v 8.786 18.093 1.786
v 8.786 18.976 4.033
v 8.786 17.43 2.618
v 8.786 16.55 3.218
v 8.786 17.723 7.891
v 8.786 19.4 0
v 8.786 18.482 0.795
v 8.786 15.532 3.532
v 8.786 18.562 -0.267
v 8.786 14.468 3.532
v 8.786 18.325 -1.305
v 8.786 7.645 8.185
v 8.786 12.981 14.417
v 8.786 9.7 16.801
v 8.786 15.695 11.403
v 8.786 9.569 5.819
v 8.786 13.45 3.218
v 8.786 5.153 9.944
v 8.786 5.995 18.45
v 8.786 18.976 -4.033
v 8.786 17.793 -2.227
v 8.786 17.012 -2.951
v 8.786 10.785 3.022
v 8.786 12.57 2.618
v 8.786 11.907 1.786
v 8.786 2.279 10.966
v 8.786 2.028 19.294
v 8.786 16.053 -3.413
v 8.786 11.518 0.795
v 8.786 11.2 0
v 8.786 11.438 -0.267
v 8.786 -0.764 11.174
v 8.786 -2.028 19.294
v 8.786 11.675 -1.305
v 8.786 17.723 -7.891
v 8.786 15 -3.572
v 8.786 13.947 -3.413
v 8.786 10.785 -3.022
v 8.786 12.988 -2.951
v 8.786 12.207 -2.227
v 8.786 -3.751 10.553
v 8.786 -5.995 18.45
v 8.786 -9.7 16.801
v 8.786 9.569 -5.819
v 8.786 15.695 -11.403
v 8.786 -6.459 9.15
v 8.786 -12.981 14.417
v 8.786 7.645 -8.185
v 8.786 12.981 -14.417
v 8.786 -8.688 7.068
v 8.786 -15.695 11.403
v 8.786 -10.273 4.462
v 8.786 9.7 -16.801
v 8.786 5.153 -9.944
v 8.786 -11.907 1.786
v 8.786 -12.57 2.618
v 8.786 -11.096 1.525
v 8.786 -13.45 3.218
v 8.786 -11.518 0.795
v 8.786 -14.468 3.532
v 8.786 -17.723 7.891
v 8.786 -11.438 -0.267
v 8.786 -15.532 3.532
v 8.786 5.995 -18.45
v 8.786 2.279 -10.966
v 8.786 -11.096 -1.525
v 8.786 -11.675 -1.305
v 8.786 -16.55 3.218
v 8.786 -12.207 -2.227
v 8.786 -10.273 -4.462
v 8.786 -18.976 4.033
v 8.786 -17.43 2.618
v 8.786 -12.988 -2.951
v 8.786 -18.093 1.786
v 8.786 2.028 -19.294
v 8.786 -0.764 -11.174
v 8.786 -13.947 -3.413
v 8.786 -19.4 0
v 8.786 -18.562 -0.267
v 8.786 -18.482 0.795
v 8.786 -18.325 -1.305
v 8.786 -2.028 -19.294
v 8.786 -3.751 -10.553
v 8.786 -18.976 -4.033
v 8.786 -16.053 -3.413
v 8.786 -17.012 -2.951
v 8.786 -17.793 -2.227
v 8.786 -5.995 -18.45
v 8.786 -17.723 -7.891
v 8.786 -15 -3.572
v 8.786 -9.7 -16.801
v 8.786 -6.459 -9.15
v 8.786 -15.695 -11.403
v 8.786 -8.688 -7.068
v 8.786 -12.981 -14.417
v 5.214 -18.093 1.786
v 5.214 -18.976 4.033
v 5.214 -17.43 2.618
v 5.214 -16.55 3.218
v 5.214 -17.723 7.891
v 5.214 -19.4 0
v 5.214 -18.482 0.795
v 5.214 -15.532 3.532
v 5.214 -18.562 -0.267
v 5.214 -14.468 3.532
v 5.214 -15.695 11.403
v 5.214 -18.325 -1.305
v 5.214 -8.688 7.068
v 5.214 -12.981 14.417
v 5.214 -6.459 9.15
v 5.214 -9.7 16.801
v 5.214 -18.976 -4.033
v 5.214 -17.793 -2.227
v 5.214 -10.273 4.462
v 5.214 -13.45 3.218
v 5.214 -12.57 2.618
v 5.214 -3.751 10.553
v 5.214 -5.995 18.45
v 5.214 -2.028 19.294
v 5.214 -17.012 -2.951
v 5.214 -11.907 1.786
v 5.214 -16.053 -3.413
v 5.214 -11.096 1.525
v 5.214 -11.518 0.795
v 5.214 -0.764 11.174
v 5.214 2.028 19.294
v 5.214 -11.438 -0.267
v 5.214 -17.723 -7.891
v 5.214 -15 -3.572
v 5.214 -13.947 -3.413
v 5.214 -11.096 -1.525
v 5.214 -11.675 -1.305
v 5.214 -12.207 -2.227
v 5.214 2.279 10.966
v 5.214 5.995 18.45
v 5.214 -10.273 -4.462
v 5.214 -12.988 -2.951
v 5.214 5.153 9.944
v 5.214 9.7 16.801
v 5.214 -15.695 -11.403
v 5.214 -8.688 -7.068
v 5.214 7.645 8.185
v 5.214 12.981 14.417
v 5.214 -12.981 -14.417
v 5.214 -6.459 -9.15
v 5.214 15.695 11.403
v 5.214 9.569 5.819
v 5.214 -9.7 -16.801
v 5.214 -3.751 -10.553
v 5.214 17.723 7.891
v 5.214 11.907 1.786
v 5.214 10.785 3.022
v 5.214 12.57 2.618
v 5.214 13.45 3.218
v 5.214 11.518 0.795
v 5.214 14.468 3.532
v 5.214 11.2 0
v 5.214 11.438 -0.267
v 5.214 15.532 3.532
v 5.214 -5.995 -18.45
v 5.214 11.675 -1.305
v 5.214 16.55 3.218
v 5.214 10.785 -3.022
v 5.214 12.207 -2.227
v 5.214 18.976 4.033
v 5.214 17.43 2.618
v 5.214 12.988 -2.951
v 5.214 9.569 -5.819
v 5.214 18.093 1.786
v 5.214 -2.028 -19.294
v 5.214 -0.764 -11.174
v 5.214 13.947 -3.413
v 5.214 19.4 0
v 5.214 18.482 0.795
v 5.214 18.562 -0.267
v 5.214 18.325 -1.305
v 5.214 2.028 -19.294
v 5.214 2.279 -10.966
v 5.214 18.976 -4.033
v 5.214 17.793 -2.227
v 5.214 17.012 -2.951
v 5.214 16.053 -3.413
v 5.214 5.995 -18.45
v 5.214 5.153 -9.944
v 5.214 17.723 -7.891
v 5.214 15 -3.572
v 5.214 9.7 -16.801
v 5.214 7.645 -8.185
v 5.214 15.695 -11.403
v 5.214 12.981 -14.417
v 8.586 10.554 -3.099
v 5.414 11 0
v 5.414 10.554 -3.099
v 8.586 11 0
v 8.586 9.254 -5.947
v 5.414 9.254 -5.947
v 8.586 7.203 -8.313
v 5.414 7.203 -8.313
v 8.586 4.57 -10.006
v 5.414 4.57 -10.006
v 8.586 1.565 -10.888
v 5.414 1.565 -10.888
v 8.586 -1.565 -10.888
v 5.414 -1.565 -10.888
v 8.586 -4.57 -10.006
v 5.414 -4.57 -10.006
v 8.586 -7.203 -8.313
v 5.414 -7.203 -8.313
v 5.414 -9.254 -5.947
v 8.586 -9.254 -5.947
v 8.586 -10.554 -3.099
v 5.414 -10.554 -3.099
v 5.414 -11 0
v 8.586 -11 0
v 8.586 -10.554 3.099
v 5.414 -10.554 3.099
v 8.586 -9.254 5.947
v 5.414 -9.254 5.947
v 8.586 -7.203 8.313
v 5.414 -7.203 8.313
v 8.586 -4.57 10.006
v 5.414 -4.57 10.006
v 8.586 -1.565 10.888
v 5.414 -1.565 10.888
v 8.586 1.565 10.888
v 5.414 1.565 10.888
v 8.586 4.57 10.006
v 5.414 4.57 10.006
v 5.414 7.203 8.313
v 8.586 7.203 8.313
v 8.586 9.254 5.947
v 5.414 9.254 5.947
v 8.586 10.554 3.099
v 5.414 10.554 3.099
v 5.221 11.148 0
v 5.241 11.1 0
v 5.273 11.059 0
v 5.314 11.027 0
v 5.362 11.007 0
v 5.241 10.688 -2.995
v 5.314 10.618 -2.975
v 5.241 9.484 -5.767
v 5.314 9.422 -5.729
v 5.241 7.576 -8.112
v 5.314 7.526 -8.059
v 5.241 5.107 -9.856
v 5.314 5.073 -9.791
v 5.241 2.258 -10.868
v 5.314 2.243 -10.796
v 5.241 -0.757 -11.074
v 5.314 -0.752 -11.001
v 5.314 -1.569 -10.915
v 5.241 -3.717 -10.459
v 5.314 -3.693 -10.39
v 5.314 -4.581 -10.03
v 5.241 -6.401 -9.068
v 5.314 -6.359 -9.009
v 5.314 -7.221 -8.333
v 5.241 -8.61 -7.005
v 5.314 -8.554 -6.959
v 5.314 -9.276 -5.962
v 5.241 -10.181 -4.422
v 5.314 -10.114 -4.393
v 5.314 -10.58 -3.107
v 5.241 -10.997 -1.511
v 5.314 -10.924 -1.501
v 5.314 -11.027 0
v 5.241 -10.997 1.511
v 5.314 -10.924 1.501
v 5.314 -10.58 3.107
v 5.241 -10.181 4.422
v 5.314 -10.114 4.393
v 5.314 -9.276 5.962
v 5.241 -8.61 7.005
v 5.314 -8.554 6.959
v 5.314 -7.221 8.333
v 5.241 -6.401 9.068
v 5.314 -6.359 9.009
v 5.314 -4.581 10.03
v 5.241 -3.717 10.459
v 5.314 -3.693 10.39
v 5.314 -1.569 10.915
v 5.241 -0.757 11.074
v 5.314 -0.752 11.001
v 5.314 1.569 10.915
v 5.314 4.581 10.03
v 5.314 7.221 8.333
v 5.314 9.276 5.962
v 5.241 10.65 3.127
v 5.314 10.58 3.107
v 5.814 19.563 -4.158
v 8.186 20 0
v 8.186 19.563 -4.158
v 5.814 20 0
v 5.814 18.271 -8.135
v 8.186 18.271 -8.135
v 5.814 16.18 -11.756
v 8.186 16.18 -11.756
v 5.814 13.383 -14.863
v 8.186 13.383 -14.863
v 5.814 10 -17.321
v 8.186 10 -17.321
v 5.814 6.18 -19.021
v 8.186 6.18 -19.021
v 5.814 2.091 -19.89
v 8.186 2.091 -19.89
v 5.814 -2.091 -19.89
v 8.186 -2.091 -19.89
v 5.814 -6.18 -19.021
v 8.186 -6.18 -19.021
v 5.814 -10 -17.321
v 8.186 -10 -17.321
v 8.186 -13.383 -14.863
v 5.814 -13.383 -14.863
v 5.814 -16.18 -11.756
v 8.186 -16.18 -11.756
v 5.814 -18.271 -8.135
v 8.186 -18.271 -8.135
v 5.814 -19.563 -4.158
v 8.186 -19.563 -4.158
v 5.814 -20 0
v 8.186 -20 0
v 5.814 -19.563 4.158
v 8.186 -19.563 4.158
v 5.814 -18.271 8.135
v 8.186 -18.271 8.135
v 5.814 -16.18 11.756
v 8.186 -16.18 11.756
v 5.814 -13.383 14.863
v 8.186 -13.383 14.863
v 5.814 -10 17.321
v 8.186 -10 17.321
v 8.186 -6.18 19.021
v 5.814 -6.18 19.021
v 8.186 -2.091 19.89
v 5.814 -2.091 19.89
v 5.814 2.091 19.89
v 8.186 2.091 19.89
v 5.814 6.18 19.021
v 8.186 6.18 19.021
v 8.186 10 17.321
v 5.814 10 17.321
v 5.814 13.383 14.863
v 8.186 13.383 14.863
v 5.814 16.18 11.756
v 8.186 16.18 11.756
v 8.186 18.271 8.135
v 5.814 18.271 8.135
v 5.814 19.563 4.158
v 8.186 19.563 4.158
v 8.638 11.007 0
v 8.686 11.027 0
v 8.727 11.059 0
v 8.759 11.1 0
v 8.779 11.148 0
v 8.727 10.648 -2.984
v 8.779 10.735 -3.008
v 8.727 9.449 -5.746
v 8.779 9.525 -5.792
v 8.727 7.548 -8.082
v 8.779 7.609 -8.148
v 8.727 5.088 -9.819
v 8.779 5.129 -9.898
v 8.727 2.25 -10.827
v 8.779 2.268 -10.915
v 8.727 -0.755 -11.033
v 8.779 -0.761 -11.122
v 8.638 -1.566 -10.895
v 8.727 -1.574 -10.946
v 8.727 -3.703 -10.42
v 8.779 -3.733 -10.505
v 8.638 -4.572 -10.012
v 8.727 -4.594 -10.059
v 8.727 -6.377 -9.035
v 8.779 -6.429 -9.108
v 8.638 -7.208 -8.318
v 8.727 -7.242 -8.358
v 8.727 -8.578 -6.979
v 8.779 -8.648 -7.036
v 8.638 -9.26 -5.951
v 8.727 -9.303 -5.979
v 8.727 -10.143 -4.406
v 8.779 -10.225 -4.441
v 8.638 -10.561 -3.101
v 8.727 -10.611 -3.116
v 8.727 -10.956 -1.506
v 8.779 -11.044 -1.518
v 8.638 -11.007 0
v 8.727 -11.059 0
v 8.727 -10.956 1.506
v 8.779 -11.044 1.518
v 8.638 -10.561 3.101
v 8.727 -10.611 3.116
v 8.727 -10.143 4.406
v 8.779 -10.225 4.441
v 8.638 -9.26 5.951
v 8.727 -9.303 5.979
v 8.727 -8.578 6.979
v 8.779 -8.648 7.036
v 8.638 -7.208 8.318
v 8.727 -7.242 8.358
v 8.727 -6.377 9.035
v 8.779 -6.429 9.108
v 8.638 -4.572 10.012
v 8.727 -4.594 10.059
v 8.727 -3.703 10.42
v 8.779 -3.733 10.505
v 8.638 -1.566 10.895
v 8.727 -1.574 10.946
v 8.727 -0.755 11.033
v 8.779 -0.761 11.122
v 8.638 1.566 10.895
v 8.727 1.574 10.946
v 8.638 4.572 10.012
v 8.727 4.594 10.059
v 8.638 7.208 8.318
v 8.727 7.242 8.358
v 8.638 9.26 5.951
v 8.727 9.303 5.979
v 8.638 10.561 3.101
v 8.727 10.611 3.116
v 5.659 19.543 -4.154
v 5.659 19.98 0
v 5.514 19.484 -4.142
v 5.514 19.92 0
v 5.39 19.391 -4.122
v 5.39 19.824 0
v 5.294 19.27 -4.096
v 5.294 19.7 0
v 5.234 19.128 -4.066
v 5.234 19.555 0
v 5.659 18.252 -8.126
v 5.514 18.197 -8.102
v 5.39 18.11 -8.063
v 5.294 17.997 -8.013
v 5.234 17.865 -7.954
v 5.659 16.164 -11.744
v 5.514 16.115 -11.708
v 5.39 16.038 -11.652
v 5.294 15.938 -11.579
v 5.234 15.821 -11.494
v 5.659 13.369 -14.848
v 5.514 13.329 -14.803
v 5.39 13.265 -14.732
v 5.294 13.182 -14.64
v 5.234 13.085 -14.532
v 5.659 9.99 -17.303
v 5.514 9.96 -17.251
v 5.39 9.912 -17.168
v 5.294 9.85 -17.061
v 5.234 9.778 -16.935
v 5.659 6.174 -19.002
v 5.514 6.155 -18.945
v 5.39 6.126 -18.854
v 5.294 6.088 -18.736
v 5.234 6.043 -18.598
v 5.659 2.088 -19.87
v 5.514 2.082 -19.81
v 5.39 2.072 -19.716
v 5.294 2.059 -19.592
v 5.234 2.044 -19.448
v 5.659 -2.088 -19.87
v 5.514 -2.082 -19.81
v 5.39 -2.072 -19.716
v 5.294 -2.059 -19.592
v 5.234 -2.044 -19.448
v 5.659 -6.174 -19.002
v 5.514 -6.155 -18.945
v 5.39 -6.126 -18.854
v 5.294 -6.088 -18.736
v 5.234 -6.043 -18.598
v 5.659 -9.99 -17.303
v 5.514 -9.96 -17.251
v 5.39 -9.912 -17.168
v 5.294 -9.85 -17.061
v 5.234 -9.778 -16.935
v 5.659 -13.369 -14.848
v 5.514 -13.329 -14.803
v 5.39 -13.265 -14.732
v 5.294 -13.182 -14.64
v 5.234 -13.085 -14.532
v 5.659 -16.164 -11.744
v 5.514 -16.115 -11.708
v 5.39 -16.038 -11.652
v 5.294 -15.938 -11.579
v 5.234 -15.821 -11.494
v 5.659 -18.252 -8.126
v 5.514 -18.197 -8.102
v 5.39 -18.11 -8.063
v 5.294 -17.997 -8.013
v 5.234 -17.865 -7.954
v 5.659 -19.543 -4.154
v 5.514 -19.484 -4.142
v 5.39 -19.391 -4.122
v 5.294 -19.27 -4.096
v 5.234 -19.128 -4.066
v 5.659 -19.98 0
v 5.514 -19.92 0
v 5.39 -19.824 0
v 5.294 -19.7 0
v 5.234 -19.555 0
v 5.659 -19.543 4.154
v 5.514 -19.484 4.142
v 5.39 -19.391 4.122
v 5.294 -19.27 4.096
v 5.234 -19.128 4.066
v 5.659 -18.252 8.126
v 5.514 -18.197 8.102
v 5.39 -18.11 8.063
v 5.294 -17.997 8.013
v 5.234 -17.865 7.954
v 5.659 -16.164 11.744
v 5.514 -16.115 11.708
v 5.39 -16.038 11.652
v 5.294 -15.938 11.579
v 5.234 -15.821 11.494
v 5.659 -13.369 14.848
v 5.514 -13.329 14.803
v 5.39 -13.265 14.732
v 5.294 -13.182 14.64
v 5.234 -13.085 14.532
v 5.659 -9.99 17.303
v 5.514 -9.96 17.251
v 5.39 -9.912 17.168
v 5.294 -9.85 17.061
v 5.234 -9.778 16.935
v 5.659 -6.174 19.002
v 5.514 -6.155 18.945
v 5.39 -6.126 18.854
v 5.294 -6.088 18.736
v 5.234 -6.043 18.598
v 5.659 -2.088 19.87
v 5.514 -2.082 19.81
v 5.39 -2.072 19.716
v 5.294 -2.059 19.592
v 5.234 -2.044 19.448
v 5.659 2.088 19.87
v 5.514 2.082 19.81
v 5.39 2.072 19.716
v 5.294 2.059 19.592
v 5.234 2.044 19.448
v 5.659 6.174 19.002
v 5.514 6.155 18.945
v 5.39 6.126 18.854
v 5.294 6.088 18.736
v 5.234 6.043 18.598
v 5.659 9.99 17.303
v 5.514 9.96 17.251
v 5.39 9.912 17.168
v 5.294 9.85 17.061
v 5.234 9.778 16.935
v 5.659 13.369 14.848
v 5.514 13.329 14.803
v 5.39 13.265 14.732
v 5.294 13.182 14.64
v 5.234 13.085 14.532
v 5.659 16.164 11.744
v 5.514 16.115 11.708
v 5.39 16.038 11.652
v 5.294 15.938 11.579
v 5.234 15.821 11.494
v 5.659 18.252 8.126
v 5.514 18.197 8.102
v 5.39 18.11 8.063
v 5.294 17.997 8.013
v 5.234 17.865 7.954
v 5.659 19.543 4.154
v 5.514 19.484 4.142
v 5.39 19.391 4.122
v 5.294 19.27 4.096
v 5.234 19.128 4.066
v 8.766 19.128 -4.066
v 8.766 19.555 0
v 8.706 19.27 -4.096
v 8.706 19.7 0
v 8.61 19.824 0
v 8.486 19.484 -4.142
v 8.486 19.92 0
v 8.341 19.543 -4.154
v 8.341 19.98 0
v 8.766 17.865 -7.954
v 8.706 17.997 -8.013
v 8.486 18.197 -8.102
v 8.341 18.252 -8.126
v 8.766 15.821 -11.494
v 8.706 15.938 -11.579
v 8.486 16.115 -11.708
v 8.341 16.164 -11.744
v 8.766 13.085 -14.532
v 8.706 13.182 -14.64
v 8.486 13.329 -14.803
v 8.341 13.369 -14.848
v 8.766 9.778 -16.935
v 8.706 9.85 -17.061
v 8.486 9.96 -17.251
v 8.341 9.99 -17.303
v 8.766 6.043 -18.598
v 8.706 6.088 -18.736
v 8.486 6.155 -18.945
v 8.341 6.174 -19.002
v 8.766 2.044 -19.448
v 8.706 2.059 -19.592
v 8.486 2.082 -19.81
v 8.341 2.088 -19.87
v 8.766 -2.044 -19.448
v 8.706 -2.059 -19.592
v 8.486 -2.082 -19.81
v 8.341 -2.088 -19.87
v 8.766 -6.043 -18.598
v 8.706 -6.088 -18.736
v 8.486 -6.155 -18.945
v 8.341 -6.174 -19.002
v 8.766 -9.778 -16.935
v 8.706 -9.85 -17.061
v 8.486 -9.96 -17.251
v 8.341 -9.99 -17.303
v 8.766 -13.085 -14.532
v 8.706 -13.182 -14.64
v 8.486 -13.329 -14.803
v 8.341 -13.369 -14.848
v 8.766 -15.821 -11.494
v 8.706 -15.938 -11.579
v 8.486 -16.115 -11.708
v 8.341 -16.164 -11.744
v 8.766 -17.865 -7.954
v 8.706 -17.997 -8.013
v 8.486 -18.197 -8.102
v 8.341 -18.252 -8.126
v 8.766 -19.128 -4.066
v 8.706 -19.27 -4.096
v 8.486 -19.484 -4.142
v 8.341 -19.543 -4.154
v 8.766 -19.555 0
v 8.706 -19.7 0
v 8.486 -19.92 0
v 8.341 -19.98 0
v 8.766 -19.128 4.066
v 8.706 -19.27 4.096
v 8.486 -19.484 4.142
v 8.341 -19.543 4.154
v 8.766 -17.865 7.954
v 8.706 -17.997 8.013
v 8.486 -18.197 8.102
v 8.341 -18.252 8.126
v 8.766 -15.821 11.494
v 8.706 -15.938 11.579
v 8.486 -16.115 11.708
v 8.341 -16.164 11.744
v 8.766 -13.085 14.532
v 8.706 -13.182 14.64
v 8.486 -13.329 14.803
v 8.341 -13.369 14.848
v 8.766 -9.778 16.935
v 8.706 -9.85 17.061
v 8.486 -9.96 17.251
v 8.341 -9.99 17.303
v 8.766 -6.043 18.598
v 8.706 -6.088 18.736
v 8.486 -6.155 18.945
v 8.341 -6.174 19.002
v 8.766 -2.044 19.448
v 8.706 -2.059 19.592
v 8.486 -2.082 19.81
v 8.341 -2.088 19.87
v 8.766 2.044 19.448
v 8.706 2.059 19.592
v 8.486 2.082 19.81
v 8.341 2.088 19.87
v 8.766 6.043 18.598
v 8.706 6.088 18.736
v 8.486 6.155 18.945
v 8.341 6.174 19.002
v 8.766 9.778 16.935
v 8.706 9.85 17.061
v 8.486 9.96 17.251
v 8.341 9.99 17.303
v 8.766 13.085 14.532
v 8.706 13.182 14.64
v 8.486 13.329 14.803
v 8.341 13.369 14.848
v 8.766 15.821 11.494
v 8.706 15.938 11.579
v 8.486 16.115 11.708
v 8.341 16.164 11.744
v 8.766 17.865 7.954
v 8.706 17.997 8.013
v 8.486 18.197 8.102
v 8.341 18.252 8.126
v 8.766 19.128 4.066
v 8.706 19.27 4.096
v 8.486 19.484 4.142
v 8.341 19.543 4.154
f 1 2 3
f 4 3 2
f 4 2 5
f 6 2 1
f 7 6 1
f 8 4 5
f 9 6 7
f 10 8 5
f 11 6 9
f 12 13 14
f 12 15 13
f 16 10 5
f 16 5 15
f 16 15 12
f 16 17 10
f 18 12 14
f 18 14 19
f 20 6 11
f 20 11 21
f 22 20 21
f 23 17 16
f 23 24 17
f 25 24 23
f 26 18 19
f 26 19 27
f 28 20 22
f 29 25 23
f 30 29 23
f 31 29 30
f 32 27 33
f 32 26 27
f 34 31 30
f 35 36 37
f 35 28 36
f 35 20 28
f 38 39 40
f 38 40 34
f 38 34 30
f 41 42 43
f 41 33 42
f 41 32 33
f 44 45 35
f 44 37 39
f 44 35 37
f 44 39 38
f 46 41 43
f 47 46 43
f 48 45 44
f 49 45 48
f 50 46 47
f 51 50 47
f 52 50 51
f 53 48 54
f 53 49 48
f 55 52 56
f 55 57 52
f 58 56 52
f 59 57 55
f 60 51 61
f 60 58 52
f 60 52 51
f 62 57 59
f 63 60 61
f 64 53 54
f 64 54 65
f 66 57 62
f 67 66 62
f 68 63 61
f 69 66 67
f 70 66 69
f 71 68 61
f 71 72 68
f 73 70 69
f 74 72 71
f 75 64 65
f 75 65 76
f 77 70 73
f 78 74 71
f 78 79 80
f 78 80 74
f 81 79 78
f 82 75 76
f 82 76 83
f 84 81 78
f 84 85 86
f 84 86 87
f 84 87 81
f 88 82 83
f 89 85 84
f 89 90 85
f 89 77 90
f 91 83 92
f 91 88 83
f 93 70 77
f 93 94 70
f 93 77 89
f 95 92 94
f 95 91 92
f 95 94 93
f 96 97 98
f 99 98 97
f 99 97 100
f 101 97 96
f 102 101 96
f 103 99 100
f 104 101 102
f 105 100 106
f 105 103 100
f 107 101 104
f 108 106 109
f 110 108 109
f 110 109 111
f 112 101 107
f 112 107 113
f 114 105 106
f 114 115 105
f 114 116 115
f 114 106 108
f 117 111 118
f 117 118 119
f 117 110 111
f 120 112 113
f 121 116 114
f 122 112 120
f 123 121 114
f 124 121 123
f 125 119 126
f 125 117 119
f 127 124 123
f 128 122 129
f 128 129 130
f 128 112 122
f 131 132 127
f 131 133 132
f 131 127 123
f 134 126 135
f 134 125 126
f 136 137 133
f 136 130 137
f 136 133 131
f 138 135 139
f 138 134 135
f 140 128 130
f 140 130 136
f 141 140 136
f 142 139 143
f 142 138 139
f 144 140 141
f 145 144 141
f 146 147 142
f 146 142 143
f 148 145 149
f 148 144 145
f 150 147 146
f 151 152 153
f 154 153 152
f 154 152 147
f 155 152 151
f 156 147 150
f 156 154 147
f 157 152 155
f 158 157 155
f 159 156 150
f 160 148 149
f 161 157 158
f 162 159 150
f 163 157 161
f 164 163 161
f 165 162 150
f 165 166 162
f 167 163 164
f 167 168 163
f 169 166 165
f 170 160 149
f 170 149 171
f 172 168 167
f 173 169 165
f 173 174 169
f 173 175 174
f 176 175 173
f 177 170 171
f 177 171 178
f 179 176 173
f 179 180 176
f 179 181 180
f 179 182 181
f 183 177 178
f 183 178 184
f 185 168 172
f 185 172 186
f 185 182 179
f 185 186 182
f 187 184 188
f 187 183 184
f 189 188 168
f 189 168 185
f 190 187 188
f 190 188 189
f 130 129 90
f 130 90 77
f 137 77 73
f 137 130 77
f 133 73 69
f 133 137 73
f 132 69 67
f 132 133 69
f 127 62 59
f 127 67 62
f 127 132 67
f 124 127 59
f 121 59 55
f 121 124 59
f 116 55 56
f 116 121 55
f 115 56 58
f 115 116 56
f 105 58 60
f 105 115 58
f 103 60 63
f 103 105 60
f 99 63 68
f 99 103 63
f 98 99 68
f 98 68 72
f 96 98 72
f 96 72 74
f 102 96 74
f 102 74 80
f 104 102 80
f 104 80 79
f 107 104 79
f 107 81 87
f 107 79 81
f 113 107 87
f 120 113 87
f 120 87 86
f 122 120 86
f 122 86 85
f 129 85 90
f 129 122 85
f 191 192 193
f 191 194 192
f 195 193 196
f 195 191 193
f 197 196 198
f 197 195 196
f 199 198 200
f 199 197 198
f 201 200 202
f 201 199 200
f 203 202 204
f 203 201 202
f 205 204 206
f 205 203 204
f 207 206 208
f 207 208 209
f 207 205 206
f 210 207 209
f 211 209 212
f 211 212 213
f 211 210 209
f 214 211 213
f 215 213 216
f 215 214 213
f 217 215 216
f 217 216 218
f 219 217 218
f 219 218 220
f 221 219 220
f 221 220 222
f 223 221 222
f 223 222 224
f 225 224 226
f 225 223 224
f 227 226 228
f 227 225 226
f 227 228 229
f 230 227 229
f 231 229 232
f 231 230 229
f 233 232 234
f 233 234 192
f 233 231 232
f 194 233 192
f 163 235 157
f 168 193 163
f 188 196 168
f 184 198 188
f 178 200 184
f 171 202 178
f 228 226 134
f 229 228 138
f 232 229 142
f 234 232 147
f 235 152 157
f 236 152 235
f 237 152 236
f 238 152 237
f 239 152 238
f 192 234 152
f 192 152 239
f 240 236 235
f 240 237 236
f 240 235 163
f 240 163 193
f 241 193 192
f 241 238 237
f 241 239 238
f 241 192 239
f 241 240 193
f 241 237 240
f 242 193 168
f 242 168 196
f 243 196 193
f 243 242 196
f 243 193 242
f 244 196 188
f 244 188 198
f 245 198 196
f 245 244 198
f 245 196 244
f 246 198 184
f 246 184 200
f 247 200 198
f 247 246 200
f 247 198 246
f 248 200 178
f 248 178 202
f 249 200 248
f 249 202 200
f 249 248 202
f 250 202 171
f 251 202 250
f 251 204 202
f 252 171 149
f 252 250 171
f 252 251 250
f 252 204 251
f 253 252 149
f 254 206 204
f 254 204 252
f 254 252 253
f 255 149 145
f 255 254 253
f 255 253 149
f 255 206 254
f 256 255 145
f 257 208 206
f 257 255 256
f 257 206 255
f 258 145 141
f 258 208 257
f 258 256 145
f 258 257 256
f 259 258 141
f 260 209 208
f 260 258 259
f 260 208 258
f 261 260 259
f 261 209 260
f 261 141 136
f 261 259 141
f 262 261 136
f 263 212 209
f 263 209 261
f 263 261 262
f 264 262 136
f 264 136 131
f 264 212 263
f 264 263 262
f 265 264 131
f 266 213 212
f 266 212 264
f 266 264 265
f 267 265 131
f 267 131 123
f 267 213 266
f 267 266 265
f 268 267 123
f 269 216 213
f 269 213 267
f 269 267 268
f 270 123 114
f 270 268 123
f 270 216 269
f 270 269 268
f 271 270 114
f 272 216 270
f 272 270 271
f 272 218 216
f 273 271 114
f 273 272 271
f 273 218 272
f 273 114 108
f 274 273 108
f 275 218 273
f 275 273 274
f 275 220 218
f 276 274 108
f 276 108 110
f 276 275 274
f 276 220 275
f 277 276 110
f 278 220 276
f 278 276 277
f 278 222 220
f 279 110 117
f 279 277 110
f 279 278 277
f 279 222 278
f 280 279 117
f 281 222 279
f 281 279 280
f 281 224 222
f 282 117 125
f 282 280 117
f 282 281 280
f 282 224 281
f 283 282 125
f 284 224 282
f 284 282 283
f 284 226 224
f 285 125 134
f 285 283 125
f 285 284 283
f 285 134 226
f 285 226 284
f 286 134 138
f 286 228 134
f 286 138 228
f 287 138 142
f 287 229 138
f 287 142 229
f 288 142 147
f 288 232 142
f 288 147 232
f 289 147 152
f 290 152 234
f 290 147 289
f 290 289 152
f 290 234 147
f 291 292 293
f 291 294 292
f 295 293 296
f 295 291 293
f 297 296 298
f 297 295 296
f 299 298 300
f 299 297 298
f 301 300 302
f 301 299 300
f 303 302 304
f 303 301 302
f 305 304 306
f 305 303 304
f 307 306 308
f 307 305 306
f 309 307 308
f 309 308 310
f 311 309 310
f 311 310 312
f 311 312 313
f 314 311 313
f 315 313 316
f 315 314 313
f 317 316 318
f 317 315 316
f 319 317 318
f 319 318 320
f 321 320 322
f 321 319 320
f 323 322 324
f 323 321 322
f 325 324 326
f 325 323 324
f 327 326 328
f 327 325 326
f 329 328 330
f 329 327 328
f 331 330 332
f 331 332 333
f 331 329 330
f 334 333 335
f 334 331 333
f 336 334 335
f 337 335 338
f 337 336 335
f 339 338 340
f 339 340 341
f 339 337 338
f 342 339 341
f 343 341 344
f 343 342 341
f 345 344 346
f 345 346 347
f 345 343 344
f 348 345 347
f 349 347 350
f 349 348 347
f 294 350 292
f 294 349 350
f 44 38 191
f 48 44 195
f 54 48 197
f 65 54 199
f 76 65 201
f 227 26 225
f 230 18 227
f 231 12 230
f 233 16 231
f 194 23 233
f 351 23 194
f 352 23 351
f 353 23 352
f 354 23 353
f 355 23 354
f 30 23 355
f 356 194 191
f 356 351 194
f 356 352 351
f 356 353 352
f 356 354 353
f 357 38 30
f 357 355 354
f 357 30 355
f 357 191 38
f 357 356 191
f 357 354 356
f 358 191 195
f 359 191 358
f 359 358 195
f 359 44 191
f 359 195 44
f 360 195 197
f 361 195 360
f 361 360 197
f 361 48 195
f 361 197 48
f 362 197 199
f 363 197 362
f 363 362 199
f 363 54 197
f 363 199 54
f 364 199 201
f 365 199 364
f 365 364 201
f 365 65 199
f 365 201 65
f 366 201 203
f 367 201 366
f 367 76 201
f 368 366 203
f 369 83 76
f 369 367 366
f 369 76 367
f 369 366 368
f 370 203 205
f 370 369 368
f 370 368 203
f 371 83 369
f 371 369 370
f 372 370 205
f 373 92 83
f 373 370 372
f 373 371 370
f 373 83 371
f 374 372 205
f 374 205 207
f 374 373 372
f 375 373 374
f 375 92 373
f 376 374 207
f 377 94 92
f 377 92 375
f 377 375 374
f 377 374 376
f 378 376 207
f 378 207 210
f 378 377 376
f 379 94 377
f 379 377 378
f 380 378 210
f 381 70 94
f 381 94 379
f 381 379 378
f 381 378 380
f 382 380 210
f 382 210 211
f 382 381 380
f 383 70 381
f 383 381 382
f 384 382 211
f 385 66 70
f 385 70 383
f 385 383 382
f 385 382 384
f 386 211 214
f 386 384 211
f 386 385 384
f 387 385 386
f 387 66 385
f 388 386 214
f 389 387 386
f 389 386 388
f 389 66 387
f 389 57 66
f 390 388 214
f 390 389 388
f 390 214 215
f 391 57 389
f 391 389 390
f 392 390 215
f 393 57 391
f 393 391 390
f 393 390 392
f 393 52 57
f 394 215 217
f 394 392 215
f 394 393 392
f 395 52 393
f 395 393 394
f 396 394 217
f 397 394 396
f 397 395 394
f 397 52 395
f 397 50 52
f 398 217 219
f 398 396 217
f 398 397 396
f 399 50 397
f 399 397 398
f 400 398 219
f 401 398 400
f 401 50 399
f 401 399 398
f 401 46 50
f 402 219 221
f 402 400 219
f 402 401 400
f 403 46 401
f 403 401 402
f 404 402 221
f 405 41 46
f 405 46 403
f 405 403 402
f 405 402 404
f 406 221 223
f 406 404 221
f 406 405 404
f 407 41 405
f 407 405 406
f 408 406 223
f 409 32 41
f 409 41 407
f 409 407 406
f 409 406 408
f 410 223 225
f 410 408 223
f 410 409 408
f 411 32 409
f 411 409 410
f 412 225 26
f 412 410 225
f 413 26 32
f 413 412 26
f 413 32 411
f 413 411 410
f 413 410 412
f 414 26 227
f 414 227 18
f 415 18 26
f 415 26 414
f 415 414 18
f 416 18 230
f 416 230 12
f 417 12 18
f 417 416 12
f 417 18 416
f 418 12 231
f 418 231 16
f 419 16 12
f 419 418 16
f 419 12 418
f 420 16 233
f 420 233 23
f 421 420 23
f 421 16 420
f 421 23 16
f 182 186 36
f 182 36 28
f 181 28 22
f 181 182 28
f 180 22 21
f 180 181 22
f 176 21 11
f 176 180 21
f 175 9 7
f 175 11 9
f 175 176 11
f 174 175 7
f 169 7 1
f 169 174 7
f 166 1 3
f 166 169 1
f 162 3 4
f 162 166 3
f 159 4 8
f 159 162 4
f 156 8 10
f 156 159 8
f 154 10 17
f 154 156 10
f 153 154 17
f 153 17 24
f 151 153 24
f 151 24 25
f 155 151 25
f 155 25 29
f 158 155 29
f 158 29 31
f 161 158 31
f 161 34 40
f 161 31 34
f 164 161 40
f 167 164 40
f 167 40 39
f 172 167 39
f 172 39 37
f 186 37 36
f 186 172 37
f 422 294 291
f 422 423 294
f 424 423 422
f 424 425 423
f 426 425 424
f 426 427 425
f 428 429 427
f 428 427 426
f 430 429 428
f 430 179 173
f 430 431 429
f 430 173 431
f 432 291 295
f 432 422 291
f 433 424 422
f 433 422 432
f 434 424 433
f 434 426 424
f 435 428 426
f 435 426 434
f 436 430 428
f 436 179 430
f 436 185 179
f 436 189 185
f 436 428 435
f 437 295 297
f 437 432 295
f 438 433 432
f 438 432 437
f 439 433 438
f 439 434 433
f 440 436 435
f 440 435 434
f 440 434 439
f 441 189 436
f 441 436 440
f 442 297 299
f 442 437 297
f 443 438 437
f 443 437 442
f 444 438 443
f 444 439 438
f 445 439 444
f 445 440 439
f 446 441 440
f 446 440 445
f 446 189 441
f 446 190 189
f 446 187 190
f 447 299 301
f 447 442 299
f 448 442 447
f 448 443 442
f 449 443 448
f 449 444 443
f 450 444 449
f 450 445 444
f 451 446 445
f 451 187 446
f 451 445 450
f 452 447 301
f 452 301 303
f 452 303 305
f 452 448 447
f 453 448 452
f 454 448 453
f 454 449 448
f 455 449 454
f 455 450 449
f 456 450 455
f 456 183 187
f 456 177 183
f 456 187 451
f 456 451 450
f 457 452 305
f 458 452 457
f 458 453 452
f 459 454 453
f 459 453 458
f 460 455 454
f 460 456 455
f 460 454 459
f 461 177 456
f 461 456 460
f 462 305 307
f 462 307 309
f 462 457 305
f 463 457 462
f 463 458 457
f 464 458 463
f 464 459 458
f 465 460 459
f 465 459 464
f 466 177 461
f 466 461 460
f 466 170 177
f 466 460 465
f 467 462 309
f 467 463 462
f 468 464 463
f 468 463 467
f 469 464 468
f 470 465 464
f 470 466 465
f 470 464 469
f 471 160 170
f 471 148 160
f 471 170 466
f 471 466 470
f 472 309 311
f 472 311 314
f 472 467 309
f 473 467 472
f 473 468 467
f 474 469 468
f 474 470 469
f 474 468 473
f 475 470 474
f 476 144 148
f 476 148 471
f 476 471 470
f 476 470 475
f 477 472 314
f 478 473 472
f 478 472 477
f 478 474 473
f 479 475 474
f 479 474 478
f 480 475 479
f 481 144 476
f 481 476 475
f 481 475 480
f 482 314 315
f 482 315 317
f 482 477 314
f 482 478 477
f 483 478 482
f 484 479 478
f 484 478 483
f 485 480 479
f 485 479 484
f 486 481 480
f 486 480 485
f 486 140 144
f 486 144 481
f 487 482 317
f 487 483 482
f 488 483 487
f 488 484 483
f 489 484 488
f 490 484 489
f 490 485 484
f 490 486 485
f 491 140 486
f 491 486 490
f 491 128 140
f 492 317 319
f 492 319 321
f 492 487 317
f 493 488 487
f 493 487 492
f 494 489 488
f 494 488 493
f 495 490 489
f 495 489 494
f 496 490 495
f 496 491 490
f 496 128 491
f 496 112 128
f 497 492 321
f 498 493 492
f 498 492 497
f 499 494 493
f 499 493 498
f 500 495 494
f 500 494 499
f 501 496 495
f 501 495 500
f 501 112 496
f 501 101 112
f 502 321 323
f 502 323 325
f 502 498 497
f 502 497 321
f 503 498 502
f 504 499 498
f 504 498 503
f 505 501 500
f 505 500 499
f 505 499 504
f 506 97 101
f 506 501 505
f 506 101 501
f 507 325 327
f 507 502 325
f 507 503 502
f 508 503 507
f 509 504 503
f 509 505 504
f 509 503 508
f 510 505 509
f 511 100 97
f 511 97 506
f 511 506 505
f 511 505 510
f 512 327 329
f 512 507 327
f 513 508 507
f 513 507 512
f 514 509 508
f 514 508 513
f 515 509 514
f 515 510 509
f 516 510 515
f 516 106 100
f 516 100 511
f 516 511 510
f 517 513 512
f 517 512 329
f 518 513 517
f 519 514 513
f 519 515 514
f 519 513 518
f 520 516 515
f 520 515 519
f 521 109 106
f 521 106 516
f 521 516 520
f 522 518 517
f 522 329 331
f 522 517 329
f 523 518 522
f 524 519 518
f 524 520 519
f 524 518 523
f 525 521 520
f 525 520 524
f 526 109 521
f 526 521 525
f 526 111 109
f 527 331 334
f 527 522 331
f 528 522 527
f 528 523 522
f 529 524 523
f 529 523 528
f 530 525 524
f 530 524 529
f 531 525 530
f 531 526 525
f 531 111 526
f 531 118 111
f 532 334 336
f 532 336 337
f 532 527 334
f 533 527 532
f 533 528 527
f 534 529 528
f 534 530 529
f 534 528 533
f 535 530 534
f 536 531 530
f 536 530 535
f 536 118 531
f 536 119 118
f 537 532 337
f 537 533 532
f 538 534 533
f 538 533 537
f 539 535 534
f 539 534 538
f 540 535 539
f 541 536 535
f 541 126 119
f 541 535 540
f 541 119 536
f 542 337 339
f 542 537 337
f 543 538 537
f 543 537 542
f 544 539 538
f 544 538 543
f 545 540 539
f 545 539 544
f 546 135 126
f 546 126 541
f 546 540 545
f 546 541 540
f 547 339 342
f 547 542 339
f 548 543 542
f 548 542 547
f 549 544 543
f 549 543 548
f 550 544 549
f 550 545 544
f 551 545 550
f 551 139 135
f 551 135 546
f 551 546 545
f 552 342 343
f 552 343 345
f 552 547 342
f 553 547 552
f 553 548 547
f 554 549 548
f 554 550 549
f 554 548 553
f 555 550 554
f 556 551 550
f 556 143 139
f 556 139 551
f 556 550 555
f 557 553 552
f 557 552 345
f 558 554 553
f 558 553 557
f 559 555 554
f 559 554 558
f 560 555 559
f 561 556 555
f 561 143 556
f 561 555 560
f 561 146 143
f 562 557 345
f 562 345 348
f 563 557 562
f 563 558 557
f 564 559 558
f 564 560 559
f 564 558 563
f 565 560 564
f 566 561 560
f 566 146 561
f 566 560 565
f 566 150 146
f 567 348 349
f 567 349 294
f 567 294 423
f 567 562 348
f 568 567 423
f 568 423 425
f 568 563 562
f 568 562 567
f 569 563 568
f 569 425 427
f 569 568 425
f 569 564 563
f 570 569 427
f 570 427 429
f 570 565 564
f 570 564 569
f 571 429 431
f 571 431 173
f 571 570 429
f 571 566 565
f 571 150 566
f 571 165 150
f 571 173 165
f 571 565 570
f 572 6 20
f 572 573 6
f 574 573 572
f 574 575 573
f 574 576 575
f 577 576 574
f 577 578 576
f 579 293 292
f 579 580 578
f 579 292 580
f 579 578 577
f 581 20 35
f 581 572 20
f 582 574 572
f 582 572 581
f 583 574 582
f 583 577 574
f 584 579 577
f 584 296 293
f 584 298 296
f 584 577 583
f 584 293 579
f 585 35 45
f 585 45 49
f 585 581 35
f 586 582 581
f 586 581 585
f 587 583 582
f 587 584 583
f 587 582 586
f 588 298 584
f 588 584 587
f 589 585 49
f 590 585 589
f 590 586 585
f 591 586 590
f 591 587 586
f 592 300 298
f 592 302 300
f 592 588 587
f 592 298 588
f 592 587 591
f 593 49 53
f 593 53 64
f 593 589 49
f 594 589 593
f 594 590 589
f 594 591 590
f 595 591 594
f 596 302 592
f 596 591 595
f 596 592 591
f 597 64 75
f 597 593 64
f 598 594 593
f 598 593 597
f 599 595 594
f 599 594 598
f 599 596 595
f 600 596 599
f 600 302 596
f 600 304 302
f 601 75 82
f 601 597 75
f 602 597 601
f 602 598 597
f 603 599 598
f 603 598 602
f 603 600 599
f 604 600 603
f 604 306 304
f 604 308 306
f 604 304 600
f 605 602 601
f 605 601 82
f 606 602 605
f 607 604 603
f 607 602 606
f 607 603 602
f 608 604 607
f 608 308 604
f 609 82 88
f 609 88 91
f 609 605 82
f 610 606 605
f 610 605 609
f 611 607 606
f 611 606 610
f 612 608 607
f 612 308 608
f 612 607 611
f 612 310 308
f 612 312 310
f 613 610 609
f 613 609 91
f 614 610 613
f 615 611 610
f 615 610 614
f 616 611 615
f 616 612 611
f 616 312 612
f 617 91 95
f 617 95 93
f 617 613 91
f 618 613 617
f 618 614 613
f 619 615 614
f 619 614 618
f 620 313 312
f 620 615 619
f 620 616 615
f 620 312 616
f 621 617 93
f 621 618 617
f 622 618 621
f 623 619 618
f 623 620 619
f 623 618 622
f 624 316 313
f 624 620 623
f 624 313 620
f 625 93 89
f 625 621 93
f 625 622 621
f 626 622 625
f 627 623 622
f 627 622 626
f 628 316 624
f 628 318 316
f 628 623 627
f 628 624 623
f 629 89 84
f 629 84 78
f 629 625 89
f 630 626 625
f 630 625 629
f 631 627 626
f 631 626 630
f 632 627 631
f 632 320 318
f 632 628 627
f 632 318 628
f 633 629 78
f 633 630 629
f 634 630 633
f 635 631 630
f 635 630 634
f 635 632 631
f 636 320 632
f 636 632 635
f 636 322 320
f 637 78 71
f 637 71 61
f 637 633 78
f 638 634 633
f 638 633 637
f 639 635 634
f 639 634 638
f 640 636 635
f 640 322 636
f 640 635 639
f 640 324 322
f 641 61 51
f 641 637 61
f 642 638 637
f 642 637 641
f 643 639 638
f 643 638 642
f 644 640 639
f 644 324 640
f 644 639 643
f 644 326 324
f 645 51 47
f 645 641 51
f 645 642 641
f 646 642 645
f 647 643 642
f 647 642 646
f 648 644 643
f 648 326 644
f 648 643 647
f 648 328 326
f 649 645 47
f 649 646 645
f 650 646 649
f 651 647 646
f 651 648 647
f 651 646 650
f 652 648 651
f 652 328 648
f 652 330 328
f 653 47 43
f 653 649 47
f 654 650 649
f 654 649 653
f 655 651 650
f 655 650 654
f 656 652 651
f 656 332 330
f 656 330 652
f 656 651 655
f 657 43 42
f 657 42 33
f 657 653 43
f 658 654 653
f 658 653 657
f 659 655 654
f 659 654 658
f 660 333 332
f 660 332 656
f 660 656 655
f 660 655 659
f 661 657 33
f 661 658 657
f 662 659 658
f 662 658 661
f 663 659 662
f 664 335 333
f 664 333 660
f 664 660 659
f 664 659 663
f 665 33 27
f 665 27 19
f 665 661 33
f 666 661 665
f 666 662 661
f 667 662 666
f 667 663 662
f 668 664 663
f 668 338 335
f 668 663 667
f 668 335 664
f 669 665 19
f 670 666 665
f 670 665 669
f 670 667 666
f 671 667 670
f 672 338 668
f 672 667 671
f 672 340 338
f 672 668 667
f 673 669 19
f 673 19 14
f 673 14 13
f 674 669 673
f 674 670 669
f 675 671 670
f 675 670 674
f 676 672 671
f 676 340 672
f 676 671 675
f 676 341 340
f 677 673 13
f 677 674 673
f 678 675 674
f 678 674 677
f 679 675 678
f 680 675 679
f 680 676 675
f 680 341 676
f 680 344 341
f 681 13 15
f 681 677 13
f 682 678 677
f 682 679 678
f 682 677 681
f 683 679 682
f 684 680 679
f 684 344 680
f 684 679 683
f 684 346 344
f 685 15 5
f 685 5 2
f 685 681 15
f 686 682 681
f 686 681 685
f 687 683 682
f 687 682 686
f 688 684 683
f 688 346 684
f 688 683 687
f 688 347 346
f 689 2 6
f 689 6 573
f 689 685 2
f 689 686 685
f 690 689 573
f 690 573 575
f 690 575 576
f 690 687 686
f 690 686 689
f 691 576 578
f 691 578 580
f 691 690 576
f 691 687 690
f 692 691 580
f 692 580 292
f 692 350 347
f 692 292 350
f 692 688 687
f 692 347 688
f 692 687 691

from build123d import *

# Parameters (mm, degrees)
CROQUIS2_R     = 3.572
EXTRUIR1_DEPTH = 12.358
CROQUIS3_R     = 3.572
EXTRUIR2_DEPTH = 12.358


with BuildPart() as part:
    # Croquis1 → Revolución1 (revolve)
    with BuildSketch(Plane.XY):
        with BuildLine():
            Line((5.214, 19.4), (5.214, 11.2))
            ThreePointArc((5.214, 11.2), (5.272578644, 11.058578644), (5.414, 11))
            Line((5.414, 11), (8.586, 11))
            ThreePointArc((8.586, 11), (8.727421356, 11.058578644), (8.786, 11.2))
            Line((8.786, 11.2), (8.786, 19.4))
            ThreePointArc((8.786, 19.4), (8.610264069, 19.824264069), (8.186, 20))
            Line((8.186, 20), (5.814, 20))
            ThreePointArc((5.814, 20), (5.389735931, 19.824264069), (5.214, 19.4))
        make_face()
    revolve(axis=Axis((50, 0, 0), (-1, 0, 0)))

    # Croquis2 → Extruir1 (cut)
    with BuildSketch(Plane(origin=(0, 0, 0), x_dir=(0, 0, -1), z_dir=(1, 0, 0))):
        with Locations((0, 15)):
            Circle(CROQUIS2_R)
    extrude(amount=EXTRUIR1_DEPTH, mode=Mode.SUBTRACT)

    # Croquis3 → Extruir2 (cut)
    with BuildSketch(Plane(origin=(0, 0, 0), x_dir=(0, 0, -1), z_dir=(1, 0, 0))):
        with Locations((0, -15)):
            Circle(CROQUIS3_R)
    extrude(amount=EXTRUIR2_DEPTH, mode=Mode.SUBTRACT)


solid = part.part
